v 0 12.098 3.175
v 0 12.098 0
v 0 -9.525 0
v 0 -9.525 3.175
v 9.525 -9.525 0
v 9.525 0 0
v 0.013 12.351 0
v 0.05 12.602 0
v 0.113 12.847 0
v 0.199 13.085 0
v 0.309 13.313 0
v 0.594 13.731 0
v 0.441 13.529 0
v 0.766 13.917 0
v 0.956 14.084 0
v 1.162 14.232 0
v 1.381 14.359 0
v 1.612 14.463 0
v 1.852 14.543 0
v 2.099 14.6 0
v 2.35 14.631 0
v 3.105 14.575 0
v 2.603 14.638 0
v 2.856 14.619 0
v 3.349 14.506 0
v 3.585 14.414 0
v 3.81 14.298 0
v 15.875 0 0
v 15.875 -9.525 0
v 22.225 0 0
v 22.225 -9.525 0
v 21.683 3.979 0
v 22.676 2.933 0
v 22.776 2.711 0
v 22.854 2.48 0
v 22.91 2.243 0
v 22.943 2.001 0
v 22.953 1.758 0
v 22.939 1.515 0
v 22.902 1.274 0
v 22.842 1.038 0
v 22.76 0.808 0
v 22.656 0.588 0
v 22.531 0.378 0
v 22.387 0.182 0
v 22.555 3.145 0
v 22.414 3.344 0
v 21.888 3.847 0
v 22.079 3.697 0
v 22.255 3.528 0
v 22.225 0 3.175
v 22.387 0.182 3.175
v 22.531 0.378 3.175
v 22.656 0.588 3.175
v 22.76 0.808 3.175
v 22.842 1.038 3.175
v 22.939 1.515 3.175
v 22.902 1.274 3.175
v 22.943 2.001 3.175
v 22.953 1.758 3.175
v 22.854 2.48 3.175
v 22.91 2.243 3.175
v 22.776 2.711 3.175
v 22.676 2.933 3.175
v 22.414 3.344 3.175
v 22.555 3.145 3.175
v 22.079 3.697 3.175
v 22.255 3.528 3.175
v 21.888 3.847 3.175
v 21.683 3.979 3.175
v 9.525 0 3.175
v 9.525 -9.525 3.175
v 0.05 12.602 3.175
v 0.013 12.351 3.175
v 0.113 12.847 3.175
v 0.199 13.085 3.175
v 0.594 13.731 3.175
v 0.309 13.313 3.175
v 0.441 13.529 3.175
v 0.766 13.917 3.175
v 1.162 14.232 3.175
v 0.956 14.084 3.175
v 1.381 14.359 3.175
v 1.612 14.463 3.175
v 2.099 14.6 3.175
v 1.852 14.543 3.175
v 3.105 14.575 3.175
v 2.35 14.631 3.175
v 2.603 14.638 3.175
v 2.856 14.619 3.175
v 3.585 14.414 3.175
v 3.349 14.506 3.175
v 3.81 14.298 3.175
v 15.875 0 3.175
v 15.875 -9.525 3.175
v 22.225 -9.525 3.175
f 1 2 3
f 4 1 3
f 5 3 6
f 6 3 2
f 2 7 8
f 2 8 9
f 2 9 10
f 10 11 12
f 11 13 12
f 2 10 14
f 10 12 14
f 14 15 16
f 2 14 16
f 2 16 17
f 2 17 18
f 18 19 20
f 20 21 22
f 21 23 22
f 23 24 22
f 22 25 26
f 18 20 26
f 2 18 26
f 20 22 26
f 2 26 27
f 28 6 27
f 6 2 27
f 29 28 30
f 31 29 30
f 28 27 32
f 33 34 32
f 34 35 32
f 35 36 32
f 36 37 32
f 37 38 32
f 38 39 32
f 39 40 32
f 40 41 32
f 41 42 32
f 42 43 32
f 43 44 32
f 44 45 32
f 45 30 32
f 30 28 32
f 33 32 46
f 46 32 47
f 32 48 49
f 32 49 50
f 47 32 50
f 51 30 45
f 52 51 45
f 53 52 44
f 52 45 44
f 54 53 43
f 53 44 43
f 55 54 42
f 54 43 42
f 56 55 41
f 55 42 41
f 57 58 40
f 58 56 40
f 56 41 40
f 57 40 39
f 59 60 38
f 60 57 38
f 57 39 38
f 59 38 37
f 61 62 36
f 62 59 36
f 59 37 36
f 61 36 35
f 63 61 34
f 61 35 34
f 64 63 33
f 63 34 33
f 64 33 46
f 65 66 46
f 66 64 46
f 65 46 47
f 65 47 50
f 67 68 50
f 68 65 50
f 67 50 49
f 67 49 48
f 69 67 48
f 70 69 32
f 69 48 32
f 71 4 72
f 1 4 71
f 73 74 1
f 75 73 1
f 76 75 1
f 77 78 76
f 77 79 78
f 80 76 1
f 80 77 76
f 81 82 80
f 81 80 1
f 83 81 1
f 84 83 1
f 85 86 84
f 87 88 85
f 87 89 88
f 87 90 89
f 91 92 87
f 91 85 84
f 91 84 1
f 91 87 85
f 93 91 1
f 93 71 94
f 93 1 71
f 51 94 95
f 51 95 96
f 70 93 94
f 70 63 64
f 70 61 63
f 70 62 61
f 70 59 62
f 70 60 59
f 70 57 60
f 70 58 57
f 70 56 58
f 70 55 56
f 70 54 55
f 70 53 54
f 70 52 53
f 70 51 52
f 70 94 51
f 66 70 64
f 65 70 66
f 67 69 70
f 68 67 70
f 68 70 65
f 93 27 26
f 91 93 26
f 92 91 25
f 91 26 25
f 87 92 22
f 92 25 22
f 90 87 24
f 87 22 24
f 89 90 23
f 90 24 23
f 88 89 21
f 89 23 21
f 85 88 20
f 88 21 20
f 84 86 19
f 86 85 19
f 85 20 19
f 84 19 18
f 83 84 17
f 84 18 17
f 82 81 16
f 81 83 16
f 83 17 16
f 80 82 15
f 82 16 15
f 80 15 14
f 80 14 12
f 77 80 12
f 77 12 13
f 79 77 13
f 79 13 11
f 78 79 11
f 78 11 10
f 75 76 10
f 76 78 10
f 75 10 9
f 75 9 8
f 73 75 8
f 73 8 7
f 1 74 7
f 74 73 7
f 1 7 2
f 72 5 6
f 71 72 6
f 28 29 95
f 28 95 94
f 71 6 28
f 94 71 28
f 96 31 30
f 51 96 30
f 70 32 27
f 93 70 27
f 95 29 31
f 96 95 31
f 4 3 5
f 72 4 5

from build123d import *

# Parameters (mm, degrees)
SKETCH1_W           = 9.525
SKETCH1_H           = 9.525
SKETCH1_W_2         = 6.35
BOSS_EXTRUDE1_DEPTH = 3.175
FILLET1_R           = 2.54


with BuildPart() as part:
    # Sketch1 → Boss-Extrude1 (new body)
    with BuildSketch(Plane.XY):
        with Locations((4.7625, -4.7625)):
            Rectangle(SKETCH1_W, SKETCH1_H)
        Polygon((28.575, 0), (0, 16.497783942), (0, 0), align=None)
        with Locations((19.05, -4.7625)):
            Rectangle(SKETCH1_W_2, SKETCH1_H)
    extrude(amount=BOSS_EXTRUDE1_DEPTH)

    # Fillet1
    # the kernel refuses this fillet: 2.54 mm, written as the material it takes off along each edge
    with BuildSketch(Plane(origin=(28.575, 0, -19.896514347), x_dir=(-0.8660254037844417, 0.4999999999999948, 0), z_dir=(0, 0, 1))) as fillet1_piece_1:
        with BuildLine():
            CenterArc((7.958605739, 2.54), FILLET1_R, 165.522487814, 104.477512186)
            Line((5.499261314, 3.175), (5.450074426, 3.1877))
            ThreePointArc((5.450074426, 3.1877), (2.724230657, 1.631494091), (-0.0254, 0.043994091))
            Line((-0.0254, 0.043994091), (0, -0.0508))
            Line((0, -0.0508), (7.958605739, -0.0508))
            Line((7.958605739, -0.0508), (7.958605739, 0))
        make_face()
    extrude(amount=42.968028694, mode=Mode.SUBTRACT)
    with BuildSketch(Plane(origin=(0, 16.497783942, -10.998522628), x_dir=(0, -1, 0), z_dir=(0, 0, 1))) as fillet1_piece_2:
        with BuildLine():
            CenterArc((FILLET1_R * 1.73205080757, FILLET1_R), FILLET1_R, 150, 120)
            Line((FILLET1_R * 0.866025403784, FILLET1_R * 1.5), (FILLET1_R * 0.848704895709, FILLET1_R * 1.51))
            Line((FILLET1_R * 0.848704895709, FILLET1_R * 1.51), (-FILLET1_R * 0.0346410161514, -FILLET1_R * 0.02))
            Line((-FILLET1_R * 0.0346410161514, -FILLET1_R * 0.02), (FILLET1_R * 1.73205080757, -FILLET1_R * 0.02))
            Line((FILLET1_R * 1.73205080757, -FILLET1_R * 0.02), (FILLET1_R * 1.73205080757, 0))
        make_face()
    extrude(amount=25.172045256, mode=Mode.SUBTRACT)


solid = part.part
